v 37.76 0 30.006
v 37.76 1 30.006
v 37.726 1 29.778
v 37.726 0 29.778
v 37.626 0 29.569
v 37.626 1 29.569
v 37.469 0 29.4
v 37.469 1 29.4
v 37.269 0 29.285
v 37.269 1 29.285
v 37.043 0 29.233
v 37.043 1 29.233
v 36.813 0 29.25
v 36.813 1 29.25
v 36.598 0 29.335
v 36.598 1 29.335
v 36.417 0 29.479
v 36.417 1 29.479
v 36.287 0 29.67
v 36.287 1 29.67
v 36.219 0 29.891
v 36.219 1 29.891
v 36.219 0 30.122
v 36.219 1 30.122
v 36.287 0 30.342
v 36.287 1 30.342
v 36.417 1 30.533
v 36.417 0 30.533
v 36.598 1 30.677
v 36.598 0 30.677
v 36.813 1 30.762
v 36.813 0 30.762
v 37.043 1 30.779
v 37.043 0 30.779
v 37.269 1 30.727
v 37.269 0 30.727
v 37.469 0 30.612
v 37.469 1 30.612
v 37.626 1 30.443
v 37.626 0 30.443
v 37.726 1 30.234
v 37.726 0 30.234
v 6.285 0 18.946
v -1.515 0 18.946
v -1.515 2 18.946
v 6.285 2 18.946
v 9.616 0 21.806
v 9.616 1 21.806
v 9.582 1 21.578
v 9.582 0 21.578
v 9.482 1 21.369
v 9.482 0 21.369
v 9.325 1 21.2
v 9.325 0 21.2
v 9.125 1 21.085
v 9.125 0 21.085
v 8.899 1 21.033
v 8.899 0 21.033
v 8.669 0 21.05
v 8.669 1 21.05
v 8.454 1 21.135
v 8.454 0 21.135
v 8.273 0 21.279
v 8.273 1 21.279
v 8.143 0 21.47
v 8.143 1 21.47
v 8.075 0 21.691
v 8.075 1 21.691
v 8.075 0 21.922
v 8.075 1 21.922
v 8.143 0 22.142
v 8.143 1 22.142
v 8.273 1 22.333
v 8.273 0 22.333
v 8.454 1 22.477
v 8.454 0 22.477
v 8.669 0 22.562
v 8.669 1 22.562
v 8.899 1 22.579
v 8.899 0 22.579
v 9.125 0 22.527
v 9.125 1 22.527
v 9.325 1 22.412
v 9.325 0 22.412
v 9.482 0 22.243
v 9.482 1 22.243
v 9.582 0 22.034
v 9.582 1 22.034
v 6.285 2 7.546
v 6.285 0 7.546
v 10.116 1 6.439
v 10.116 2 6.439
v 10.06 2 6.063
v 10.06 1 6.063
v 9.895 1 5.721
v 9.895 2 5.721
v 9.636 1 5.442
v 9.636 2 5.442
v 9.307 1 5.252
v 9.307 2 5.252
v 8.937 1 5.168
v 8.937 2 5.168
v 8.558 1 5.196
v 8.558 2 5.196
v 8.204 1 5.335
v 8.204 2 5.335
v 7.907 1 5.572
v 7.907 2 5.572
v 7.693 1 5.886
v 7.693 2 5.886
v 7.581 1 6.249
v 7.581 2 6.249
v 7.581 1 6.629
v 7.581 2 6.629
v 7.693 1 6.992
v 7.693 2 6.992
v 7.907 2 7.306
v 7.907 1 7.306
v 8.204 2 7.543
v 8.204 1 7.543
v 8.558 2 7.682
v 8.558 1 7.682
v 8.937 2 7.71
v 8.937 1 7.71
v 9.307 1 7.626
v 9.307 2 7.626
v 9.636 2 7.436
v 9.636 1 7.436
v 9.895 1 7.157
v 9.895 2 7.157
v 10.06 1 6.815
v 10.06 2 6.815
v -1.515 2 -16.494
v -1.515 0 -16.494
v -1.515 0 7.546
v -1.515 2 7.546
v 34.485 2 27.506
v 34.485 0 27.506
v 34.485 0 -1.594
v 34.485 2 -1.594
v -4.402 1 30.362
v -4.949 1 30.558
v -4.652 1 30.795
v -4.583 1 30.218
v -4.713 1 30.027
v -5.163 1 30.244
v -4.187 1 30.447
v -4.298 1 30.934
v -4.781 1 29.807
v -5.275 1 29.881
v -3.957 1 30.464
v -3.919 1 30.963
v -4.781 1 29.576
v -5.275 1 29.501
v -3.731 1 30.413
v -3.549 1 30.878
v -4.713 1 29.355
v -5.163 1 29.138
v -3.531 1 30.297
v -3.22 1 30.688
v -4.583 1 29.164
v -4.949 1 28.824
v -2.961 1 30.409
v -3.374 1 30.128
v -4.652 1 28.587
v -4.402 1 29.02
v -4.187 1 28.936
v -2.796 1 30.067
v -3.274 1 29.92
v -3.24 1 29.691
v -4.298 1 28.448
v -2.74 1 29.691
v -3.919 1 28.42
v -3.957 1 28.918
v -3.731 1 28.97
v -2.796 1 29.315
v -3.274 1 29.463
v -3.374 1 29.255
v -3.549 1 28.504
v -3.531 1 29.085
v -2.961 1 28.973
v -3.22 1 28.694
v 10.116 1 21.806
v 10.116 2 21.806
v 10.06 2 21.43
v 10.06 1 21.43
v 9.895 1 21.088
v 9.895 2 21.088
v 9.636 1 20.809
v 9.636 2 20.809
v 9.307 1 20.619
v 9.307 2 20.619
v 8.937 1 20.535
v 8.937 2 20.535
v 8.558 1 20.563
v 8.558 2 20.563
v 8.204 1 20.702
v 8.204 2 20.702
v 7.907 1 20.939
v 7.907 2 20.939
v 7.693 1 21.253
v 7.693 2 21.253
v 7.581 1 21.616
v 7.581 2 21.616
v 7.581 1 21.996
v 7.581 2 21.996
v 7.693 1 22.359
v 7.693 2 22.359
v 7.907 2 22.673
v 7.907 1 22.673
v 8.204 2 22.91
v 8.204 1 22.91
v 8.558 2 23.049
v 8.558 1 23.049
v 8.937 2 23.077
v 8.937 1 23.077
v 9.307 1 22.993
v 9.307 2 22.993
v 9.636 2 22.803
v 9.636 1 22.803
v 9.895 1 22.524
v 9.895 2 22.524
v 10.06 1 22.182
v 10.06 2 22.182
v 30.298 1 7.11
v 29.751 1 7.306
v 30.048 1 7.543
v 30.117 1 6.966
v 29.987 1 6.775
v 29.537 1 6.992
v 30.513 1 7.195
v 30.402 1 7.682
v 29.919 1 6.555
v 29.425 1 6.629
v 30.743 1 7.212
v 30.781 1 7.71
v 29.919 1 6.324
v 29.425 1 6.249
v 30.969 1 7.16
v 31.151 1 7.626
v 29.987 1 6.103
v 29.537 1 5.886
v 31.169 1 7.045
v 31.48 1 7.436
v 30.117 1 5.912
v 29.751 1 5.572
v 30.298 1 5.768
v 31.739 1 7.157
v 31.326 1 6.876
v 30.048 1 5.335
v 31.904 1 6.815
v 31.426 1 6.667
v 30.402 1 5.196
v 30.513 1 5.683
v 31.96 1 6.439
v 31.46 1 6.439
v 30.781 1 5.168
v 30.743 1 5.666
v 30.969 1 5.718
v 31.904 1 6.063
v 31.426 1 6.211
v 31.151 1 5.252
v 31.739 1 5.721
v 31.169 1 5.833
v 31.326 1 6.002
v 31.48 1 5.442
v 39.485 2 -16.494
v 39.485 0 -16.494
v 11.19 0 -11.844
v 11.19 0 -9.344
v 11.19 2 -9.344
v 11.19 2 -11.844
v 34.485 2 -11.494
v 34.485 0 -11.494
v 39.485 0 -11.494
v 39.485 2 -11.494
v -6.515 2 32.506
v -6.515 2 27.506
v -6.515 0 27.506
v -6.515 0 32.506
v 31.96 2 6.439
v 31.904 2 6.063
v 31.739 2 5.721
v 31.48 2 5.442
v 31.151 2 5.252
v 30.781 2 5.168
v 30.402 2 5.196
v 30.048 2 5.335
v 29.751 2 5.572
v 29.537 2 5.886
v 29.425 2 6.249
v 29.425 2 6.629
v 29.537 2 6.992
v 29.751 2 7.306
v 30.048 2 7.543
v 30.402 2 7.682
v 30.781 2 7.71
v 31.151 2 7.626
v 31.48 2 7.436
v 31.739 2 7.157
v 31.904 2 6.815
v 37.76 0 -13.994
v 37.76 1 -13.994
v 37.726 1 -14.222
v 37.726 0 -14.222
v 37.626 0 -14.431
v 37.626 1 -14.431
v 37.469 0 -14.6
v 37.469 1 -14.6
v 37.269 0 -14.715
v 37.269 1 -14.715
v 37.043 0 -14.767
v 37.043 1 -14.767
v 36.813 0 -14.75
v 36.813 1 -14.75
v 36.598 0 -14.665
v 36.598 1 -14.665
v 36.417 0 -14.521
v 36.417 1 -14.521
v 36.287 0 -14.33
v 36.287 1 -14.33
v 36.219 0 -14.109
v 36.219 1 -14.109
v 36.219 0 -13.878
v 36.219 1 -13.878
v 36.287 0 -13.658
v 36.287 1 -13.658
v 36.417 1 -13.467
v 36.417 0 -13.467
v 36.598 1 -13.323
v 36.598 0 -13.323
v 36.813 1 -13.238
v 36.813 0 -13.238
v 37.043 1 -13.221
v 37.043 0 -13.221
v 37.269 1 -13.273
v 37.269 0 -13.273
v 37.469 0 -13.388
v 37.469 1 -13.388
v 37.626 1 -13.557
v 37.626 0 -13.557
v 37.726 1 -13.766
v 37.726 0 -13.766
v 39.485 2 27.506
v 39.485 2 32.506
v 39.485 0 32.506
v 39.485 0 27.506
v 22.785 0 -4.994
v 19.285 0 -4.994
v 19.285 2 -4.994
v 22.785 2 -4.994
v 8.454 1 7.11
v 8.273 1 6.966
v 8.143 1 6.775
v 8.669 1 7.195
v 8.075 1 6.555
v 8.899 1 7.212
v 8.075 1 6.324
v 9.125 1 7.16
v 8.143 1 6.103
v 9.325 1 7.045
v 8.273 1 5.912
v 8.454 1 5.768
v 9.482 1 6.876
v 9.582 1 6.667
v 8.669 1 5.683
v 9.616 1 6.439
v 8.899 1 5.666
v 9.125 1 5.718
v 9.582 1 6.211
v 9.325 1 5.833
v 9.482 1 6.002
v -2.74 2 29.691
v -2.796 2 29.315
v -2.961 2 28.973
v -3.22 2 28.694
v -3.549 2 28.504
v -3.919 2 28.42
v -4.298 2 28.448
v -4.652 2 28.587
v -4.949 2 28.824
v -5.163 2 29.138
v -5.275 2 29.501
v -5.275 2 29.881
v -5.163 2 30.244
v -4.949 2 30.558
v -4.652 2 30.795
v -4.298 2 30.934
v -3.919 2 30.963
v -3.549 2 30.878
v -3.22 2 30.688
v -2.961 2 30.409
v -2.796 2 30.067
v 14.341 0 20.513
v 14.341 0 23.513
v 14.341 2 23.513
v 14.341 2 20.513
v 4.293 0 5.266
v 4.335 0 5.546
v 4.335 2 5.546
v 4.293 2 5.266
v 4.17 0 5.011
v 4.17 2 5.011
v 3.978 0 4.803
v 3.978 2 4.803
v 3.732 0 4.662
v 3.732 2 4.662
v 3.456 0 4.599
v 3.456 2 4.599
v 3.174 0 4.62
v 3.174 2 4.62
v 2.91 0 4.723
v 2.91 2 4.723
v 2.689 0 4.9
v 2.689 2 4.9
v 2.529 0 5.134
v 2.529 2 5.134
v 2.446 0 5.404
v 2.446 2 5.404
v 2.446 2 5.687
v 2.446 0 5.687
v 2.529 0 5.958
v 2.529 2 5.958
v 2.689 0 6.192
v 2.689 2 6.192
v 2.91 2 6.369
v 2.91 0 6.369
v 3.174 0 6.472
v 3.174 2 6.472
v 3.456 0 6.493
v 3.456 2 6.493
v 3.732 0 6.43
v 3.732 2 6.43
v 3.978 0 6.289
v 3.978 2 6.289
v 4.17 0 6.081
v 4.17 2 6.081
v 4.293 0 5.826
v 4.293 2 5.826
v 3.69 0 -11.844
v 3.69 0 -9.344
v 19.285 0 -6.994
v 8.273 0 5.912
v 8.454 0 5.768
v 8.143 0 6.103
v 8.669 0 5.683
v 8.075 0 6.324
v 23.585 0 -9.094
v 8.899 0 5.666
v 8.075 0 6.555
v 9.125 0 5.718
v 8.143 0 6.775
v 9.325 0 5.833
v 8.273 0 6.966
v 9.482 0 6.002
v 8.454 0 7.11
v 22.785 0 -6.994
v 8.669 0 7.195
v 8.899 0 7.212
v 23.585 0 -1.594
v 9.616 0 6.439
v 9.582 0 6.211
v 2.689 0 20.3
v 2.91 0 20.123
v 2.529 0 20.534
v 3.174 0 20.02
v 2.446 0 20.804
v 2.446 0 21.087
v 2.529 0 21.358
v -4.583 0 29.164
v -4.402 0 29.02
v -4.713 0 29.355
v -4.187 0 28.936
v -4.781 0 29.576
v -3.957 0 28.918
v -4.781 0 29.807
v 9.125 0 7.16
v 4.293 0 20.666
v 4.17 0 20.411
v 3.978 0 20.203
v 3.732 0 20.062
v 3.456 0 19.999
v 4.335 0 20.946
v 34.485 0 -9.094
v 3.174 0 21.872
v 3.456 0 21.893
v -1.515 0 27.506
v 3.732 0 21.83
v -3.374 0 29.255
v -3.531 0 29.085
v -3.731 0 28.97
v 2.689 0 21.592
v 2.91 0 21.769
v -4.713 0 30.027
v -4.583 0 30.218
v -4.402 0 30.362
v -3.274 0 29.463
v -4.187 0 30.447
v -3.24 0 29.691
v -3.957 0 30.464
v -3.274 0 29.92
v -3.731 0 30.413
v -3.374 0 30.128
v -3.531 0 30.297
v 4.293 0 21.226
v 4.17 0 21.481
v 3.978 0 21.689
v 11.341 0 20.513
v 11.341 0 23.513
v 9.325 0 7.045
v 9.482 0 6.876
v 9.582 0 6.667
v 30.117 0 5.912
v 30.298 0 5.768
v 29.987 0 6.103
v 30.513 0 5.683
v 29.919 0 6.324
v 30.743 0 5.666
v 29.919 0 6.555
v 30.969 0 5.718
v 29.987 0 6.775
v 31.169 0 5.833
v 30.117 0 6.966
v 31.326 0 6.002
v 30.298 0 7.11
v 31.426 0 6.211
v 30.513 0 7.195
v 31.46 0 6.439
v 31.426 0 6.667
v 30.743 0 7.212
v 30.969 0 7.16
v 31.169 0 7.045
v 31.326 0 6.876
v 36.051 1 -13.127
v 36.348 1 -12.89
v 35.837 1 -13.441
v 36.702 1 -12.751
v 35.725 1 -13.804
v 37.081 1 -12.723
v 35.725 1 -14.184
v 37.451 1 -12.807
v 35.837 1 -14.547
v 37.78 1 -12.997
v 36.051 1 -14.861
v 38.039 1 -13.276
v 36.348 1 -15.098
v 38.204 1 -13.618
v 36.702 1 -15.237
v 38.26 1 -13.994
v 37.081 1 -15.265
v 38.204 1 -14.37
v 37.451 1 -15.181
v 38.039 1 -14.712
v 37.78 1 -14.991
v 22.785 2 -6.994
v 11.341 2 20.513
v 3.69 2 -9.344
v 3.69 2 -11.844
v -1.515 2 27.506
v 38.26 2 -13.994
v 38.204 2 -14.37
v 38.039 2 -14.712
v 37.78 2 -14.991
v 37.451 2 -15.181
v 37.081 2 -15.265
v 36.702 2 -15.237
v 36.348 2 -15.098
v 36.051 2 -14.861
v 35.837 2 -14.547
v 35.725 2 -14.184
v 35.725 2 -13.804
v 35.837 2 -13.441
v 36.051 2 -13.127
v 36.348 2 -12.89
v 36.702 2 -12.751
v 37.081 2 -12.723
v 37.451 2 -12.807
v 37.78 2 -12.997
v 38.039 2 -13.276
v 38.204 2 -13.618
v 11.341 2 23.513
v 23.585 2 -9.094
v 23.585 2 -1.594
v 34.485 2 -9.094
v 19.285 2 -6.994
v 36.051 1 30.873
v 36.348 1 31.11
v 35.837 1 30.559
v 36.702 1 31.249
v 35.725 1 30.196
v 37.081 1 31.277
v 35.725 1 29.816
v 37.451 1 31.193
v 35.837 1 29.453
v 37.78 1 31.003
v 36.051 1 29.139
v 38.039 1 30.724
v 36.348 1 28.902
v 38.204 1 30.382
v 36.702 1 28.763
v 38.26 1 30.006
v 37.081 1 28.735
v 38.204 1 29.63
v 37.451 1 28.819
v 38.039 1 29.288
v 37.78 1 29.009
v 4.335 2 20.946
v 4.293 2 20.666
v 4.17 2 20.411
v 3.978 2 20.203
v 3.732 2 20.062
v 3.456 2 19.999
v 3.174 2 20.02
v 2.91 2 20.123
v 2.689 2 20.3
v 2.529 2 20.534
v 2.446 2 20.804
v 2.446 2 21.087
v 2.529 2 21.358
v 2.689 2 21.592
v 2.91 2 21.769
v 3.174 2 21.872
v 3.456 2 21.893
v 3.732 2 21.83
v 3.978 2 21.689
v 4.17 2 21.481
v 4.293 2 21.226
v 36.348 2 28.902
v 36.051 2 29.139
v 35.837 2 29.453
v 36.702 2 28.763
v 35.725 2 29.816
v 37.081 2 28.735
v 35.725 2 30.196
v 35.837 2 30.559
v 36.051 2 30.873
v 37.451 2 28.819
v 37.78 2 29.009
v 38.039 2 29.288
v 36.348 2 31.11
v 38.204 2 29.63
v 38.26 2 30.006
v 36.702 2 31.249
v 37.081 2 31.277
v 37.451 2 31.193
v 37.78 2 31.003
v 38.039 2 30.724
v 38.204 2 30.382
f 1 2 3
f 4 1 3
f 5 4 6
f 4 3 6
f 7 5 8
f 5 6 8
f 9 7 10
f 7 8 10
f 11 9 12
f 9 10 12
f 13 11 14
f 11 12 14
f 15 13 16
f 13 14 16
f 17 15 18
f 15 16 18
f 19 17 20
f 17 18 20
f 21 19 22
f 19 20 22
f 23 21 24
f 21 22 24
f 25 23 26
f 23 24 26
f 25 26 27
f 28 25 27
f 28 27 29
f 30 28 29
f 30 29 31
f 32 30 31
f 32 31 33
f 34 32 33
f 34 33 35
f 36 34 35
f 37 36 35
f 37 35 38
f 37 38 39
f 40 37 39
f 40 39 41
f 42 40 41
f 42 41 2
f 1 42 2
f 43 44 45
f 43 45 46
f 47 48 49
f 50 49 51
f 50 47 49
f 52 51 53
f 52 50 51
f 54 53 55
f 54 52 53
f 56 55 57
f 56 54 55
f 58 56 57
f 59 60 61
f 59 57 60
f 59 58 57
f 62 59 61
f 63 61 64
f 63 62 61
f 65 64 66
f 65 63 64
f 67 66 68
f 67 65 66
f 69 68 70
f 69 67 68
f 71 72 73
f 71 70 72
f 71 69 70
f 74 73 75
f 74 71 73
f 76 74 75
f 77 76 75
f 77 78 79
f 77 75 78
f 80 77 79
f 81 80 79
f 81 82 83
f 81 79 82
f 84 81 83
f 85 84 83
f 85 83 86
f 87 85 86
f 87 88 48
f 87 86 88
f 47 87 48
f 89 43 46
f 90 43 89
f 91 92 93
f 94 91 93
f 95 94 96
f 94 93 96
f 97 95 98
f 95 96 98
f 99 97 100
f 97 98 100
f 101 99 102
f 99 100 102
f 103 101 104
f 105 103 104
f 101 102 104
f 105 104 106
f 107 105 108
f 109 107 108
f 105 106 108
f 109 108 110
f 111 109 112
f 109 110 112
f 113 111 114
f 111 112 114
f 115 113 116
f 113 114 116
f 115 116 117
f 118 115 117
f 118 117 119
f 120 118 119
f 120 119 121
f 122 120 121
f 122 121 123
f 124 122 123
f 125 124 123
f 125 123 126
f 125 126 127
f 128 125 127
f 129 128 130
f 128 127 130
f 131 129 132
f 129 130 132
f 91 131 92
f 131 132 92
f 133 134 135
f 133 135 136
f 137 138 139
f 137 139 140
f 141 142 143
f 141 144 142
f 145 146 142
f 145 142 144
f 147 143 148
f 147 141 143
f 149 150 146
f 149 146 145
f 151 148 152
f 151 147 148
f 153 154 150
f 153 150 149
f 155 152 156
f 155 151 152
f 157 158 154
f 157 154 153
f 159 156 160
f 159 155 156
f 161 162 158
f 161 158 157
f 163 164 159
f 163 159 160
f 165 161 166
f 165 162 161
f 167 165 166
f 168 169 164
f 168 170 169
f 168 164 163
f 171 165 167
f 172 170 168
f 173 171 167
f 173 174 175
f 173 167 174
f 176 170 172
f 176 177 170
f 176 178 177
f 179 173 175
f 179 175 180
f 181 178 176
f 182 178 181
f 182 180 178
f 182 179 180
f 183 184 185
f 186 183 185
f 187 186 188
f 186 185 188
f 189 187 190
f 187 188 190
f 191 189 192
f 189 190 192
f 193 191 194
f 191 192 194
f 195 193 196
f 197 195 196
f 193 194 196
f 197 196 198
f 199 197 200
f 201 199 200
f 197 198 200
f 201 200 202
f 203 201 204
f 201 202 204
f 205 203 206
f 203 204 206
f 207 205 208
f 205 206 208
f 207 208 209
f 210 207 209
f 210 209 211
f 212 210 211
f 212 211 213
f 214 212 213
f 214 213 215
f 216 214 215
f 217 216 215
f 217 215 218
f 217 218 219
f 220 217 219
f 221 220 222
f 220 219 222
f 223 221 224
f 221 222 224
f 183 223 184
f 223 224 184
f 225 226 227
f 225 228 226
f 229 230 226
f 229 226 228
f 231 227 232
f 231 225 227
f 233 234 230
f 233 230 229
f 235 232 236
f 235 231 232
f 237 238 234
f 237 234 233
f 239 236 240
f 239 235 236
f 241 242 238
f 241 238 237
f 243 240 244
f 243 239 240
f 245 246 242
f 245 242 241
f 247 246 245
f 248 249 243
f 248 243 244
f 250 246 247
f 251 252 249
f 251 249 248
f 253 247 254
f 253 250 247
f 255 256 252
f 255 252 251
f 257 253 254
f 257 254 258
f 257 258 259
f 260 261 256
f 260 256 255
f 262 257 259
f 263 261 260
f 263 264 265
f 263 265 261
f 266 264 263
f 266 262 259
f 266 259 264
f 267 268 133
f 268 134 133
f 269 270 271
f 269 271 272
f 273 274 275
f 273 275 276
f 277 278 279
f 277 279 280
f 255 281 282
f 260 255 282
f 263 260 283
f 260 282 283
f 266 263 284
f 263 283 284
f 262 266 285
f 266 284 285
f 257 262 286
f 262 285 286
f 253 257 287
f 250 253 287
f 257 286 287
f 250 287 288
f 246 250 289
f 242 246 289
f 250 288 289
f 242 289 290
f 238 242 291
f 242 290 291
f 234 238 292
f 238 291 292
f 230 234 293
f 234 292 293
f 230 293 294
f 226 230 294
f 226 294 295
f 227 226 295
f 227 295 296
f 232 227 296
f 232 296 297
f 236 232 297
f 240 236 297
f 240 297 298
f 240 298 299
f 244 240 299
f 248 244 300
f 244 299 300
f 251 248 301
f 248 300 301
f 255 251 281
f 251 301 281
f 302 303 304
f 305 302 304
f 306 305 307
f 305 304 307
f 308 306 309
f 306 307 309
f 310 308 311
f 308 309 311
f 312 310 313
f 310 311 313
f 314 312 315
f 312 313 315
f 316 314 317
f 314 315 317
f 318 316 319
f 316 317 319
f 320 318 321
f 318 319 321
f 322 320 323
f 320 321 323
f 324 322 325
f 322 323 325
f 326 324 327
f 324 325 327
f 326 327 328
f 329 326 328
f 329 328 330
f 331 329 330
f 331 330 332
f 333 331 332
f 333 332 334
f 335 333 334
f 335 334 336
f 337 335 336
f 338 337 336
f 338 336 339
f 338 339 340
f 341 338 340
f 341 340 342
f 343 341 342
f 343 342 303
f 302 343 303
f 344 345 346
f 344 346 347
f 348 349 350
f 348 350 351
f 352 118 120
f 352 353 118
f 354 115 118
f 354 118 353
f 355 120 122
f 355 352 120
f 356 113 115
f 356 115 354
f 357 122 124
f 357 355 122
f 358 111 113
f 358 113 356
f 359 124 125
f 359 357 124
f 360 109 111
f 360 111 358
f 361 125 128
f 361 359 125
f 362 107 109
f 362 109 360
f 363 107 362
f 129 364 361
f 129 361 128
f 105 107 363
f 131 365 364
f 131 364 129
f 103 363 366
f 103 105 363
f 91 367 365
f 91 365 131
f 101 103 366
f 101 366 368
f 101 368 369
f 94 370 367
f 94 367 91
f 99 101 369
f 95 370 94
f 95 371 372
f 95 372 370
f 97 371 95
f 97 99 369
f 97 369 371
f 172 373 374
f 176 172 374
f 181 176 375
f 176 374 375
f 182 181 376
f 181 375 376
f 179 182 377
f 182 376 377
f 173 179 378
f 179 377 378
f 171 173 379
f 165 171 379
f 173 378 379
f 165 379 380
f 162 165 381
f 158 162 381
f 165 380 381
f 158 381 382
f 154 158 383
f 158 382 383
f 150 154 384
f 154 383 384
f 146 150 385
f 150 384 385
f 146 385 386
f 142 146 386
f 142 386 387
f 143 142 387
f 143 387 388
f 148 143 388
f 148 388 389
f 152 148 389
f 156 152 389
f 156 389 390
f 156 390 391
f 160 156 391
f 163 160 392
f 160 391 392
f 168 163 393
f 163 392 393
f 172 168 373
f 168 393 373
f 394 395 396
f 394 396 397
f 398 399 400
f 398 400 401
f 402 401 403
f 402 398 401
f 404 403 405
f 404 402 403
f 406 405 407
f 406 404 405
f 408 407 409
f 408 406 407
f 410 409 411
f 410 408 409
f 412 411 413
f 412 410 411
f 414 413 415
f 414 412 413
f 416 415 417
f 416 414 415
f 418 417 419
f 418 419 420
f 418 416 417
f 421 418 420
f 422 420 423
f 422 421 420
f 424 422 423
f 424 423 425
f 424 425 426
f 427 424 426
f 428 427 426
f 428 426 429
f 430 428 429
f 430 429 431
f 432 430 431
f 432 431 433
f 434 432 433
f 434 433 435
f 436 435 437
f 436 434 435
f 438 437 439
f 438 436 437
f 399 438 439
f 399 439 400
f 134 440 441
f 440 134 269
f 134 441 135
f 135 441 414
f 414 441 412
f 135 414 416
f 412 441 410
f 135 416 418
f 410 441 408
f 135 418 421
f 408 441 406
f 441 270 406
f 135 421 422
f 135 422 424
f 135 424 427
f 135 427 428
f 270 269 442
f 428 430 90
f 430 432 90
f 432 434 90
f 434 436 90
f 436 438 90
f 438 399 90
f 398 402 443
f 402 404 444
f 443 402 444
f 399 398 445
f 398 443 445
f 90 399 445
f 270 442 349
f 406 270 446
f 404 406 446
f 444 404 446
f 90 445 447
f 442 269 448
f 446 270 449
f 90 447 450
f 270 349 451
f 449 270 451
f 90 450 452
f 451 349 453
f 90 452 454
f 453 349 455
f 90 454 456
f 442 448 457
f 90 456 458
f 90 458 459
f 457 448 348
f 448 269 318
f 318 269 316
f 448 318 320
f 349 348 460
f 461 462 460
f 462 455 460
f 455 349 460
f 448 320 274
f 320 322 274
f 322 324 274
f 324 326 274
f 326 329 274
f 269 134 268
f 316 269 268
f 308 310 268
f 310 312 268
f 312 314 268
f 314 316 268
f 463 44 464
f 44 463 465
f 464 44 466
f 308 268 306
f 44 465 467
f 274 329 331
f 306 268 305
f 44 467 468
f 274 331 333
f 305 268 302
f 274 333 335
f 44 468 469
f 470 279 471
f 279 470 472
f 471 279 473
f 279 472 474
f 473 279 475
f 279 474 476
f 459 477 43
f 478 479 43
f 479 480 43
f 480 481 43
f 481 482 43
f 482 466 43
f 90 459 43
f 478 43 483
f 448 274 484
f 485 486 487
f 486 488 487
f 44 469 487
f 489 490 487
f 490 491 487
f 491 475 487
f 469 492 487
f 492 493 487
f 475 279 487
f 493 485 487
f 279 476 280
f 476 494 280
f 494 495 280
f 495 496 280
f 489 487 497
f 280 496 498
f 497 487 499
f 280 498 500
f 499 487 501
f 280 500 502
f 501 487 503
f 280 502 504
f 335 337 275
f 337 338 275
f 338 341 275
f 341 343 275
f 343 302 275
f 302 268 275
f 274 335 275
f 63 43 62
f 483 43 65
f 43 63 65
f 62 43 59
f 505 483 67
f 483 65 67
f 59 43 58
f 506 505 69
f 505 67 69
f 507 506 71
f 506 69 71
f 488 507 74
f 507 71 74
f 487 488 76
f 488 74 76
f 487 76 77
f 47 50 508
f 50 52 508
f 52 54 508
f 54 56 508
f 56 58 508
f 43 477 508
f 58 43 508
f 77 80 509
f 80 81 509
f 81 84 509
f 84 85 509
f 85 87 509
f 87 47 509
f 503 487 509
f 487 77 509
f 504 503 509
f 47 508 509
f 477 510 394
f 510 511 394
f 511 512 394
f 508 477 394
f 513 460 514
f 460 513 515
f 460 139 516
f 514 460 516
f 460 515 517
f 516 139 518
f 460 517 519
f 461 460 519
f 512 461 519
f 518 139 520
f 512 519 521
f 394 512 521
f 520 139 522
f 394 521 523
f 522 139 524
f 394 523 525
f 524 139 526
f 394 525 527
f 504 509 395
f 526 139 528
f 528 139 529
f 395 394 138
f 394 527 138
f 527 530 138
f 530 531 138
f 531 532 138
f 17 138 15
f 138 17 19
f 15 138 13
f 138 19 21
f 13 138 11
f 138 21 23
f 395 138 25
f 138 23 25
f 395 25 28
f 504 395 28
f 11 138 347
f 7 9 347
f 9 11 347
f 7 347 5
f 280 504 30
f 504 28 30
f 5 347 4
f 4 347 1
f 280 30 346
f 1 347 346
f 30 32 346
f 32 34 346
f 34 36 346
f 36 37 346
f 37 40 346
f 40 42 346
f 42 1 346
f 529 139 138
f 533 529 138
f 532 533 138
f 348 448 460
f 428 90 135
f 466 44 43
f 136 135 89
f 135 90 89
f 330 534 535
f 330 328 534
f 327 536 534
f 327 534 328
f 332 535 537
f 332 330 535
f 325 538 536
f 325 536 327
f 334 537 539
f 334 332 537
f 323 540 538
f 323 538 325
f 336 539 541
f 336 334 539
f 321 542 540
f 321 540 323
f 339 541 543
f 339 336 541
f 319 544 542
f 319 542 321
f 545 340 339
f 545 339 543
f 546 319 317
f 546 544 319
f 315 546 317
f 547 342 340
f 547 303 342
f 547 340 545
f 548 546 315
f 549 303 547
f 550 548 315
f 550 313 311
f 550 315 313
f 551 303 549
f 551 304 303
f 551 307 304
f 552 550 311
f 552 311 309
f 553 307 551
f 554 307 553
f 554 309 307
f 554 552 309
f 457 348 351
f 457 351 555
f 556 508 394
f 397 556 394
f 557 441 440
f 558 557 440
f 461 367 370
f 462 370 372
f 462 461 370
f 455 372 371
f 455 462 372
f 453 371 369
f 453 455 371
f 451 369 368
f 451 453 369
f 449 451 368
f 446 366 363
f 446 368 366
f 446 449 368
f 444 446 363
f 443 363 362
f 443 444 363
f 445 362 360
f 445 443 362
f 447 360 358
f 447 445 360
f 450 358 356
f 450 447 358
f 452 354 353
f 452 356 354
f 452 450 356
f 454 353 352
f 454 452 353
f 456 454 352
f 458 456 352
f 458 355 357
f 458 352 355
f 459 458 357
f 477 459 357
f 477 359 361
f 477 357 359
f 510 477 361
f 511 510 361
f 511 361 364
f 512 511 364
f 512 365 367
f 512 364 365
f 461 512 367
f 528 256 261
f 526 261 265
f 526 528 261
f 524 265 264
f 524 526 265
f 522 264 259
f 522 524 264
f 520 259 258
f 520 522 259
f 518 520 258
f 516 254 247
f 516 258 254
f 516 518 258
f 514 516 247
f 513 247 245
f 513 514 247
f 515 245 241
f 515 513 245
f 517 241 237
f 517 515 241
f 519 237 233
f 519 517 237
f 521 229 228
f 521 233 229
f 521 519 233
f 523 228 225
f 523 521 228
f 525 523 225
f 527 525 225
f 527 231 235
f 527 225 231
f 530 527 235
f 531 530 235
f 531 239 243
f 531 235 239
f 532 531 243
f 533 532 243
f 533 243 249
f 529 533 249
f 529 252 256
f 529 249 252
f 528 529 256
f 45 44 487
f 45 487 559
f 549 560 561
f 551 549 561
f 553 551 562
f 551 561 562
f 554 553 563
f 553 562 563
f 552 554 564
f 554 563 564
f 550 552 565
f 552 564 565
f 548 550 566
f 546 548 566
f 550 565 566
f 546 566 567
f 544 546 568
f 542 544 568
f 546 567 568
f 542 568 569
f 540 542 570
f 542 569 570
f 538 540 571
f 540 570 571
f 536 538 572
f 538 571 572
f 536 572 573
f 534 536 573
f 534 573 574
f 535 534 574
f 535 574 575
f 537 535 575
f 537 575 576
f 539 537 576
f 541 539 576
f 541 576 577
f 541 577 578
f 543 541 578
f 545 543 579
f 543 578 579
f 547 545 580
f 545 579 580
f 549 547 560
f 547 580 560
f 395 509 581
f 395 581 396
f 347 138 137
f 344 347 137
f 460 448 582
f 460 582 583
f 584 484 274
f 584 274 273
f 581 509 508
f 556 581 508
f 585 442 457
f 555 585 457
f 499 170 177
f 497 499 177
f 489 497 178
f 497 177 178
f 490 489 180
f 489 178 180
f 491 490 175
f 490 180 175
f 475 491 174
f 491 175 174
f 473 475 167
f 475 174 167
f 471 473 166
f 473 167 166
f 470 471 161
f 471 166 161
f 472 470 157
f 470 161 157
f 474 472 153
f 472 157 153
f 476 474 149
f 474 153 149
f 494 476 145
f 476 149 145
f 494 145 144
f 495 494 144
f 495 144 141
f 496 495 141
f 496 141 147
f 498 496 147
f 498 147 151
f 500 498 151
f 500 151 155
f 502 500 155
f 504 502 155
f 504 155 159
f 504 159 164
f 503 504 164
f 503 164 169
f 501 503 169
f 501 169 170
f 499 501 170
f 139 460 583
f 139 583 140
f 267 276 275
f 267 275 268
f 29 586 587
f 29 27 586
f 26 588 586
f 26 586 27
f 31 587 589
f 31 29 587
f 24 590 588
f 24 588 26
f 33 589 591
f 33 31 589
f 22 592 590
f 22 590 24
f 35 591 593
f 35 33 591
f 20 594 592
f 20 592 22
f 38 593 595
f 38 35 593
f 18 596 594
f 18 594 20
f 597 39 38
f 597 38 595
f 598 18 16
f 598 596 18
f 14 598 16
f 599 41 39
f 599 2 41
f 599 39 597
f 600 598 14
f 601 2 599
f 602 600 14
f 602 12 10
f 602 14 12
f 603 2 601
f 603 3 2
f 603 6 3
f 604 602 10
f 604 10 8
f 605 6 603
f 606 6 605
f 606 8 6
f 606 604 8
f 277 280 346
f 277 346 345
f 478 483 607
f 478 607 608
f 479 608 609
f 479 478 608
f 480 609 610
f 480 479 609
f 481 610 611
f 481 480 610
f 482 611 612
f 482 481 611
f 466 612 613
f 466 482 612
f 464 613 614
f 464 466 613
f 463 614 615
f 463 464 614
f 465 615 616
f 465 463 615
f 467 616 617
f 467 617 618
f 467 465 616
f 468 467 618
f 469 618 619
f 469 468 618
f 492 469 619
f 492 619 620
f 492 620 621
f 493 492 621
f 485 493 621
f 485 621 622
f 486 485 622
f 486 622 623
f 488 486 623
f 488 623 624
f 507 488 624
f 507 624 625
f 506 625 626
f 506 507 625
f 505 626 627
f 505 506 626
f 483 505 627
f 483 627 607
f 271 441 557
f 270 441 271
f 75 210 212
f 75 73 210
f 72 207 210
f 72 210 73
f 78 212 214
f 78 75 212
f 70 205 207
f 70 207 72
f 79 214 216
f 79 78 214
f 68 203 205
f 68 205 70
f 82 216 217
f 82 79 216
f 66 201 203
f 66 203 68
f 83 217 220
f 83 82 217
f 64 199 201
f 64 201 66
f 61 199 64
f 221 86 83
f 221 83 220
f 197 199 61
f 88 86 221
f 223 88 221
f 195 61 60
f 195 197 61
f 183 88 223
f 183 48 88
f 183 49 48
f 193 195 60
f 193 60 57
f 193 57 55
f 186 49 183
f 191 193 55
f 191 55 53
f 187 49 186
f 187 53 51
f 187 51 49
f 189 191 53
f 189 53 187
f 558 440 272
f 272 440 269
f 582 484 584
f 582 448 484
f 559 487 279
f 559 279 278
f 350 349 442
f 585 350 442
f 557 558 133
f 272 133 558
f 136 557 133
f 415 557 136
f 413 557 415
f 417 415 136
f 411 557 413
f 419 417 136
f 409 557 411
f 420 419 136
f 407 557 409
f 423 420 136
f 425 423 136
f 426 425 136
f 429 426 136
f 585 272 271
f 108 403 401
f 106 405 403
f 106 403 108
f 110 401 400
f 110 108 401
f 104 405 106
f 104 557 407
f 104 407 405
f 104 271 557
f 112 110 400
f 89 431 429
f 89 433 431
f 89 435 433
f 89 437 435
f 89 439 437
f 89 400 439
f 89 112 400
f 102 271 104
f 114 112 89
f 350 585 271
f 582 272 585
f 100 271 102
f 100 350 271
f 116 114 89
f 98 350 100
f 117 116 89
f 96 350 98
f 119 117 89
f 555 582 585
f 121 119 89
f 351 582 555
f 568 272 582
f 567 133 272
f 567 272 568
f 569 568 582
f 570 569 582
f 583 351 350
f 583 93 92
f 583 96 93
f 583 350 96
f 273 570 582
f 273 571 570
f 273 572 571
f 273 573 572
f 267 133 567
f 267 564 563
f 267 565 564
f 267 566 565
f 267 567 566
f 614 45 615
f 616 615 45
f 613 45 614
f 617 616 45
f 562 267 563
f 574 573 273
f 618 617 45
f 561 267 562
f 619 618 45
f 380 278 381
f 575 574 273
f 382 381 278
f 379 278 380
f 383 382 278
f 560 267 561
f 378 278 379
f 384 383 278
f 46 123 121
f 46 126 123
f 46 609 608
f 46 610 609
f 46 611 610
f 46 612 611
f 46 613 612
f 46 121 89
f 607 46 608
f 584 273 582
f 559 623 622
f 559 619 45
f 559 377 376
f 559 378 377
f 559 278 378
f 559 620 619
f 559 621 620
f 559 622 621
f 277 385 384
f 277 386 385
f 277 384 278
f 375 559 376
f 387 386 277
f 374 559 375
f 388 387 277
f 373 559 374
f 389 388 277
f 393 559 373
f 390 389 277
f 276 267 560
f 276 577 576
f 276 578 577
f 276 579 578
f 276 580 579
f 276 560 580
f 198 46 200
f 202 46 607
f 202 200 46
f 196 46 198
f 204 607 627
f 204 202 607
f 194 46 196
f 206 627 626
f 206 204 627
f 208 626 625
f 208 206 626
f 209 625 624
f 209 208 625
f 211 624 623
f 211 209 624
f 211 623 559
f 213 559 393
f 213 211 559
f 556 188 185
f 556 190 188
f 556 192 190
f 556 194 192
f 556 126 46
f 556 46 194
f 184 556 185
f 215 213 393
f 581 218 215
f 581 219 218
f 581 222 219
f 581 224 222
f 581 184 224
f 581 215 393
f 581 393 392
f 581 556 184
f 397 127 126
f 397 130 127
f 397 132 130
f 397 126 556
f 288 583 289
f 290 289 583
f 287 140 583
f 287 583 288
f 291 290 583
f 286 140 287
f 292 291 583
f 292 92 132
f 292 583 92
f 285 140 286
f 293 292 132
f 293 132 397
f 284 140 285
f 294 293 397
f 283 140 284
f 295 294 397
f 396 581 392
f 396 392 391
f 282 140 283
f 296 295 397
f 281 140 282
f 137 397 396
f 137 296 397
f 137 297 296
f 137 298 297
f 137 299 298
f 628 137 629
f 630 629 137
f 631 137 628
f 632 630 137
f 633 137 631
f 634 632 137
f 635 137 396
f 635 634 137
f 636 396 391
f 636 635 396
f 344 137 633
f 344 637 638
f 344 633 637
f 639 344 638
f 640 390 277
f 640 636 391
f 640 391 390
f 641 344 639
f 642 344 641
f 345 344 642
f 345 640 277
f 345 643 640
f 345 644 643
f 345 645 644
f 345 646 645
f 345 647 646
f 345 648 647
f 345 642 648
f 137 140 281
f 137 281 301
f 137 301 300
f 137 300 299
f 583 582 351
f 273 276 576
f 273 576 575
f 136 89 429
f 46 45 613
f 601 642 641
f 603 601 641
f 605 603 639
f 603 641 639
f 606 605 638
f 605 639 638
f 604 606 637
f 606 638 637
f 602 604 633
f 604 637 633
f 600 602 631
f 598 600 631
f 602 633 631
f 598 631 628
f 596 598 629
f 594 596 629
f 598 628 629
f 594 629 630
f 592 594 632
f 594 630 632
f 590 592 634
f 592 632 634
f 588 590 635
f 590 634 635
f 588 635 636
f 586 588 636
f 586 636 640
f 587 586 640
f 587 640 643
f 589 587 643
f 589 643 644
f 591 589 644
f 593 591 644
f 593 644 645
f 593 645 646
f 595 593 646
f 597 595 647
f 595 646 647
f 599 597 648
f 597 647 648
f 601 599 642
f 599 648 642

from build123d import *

# Parameters (mm, degrees)
SKETCH1_R           = 0.775
SKETCH1_R_2         = 0.95
SKETCH1_W           = 3
SKETCH1_H           = 3
SKETCH1_W_2         = 3.5
SKETCH1_H_2         = 2
SKETCH1_W_3         = 7.5
SKETCH1_H_3         = 2.5
BOSS_EXTRUDE1_DEPTH = 2
SKETCH2_R           = 1.275
CUT_EXTRUDE1_DEPTH  = 1
SKETCH4_W           = 22.039842778
SKETCH4_H           = 2
SKETCH4_W_2         = 11.560157222
BOSS_EXTRUDE3_DEPTH = 2
SKETCH5_W           = 5.4
SKETCH5_H           = 2
SKETCH5_W_2         = 32.1
BOSS_EXTRUDE4_DEPTH = 2
SKETCH6_W           = 36
SKETCH6_H           = 2
BOSS_EXTRUDE5_DEPTH = 2
SKETCH7_W           = 36
SKETCH7_H           = 2
BOSS_EXTRUDE6_DEPTH = 2
SKETCH8_W           = 5
SKETCH8_H           = 2
BOSS_EXTRUDE7_DEPTH = 5
SKETCH9_W           = 5
SKETCH9_H           = 2
BOSS_EXTRUDE8_DEPTH = 5
SKETCH10_R          = 0.775
CUT_EXTRUDE2_DEPTH  = 5
SKETCH11_R          = 1.275
CUT_EXTRUDE3_DEPTH  = 1


with BuildPart() as part:
    # Sketch1 → Boss-Extrude1 (new body)
    with BuildSketch(Plane(origin=(0, 0, 0), x_dir=(1, 0, 0), z_dir=(0, 1, 0))):
        Polygon((32.485414634, 9.09397561), (23.585414634, 9.09397561), (23.585414634, 1.59397561), (32.485414634, 1.59397561), (32.485414634, -30.50602439), (0.485414634, -30.50602439), (0.485414634, -18.945867168), (6.285414634, -18.945867168), (6.285414634, -7.545867168), (0.485414634, -7.545867168), (0.485414634, 14.49397561), (32.485414634, 14.49397561), align=None)
        with Locations((30.685414634, -6.43902439)):
            Circle(SKETCH1_R, mode=Mode.SUBTRACT)
        with Locations((8.841414634, -6.43902439)):
            Circle(SKETCH1_R, mode=Mode.SUBTRACT)
        with Locations((8.841414634, -21.80602439)):
            Circle(SKETCH1_R, mode=Mode.SUBTRACT)
        with Locations((3.385414634, -5.545867168)):
            Circle(SKETCH1_R_2, mode=Mode.SUBTRACT)
        with Locations((3.385414634, -20.945867168)):
            Circle(SKETCH1_R_2, mode=Mode.SUBTRACT)
        with Locations((12.841414634, -22.013272234)):
            Rectangle(SKETCH1_W, SKETCH1_H, mode=Mode.SUBTRACT)
        with Locations((21.035414634, 5.99397561)):
            Rectangle(SKETCH1_W_2, SKETCH1_H_2, mode=Mode.SUBTRACT)
        with Locations((7.439637151, 10.59397561)):
            Rectangle(SKETCH1_W_3, SKETCH1_H_3, mode=Mode.SUBTRACT)
    extrude(amount=BOSS_EXTRUDE1_DEPTH)

    # Sketch2 → Cut-Extrude1 (cut)
    with BuildSketch(Plane(origin=(0, 2, 0), x_dir=(1, 0, 0), z_dir=(0, 1, 0))):
        with Locations((8.841414634, -6.43902439)):
            Circle(SKETCH2_R)
        with Locations((30.685414634, -6.43902439)):
            Circle(SKETCH2_R)
        with Locations((8.841414634, -21.80602439)):
            Circle(SKETCH2_R)
    extrude(amount=-CUT_EXTRUDE1_DEPTH, mode=Mode.SUBTRACT)

    # Sketch4 → Boss-Extrude3 (add)
    with BuildSketch(Plane.ZY.offset(-0.485414634)):
        with Locations((-3.474054221, 1)):
            Rectangle(SKETCH4_W, SKETCH4_H)
        with Locations((24.725945779, 1)):
            Rectangle(SKETCH4_W_2, SKETCH4_H)
    extrude(amount=BOSS_EXTRUDE3_DEPTH)

    # Sketch5 → Boss-Extrude4 (add)
    with BuildSketch(Plane(origin=(32.485414634, 0, 0), x_dir=(0, 0, -1), z_dir=(1, 0, 0))):
        with Locations((11.79397561, 1)):
            Rectangle(SKETCH5_W, SKETCH5_H)
        with Locations((-14.45602439, 1)):
            Rectangle(SKETCH5_W_2, SKETCH5_H)
    extrude(amount=BOSS_EXTRUDE4_DEPTH)

    # Sketch6 → Boss-Extrude5 (add)
    with BuildSketch(Plane(origin=(0, 0, -14.49397561), x_dir=(-1, 0, 0), z_dir=(0, 0, -1))):
        with Locations((-16.485414634, 1)):
            Rectangle(SKETCH6_W, SKETCH6_H)
    extrude(amount=BOSS_EXTRUDE5_DEPTH)

    # Sketch7 → Boss-Extrude6 (add)
    with BuildSketch(Plane.XY.offset(30.50602439)):
        with Locations((16.485414634, 1)):
            Rectangle(SKETCH7_W, SKETCH7_H)
    extrude(amount=BOSS_EXTRUDE6_DEPTH)

    # Sketch8 → Boss-Extrude7 (add)
    with BuildSketch(Plane(origin=(34.485414634, 0, 0), x_dir=(0, 0, -1), z_dir=(1, 0, 0))):
        with Locations((13.99397561, 1)):
            Rectangle(SKETCH8_W, SKETCH8_H)
        with Locations((-30.00602439, 1)):
            Rectangle(SKETCH8_W, SKETCH8_H)
    extrude(amount=BOSS_EXTRUDE7_DEPTH)

    # Sketch9 → Boss-Extrude8 (add)
    with BuildSketch(Plane.ZY.offset(1.514585366)):
        with Locations((30.00602439, 1)):
            Rectangle(SKETCH9_W, SKETCH9_H)
    extrude(amount=BOSS_EXTRUDE8_DEPTH)

    # Sketch10 → Cut-Extrude2 (cut)
    with BuildSketch(Plane(origin=(0, 2, 0), x_dir=(1, 0, 0), z_dir=(0, 1, 0))):
        with Locations((36.985414634, 13.99397561)):
            Circle(SKETCH10_R)
        with Locations((36.985414634, -30.00602439)):
            Circle(SKETCH10_R)
        with Locations((-4.014585366, -29.691233116)):
            Circle(SKETCH10_R)
    extrude(amount=-CUT_EXTRUDE2_DEPTH, mode=Mode.SUBTRACT)

    # Sketch11 → Cut-Extrude3 (cut)
    with BuildSketch(Plane(origin=(0, 2, 0), x_dir=(1, 0, 0), z_dir=(0, 1, 0))):
        with Locations((36.985414634, 13.99397561)):
            Circle(SKETCH11_R)
        with Locations((36.985414634, -30.00602439)):
            Circle(SKETCH11_R)
        with Locations((-4.014585366, -29.691233116)):
            Circle(SKETCH11_R)
    extrude(amount=-CUT_EXTRUDE3_DEPTH, mode=Mode.SUBTRACT)


solid = part.part
